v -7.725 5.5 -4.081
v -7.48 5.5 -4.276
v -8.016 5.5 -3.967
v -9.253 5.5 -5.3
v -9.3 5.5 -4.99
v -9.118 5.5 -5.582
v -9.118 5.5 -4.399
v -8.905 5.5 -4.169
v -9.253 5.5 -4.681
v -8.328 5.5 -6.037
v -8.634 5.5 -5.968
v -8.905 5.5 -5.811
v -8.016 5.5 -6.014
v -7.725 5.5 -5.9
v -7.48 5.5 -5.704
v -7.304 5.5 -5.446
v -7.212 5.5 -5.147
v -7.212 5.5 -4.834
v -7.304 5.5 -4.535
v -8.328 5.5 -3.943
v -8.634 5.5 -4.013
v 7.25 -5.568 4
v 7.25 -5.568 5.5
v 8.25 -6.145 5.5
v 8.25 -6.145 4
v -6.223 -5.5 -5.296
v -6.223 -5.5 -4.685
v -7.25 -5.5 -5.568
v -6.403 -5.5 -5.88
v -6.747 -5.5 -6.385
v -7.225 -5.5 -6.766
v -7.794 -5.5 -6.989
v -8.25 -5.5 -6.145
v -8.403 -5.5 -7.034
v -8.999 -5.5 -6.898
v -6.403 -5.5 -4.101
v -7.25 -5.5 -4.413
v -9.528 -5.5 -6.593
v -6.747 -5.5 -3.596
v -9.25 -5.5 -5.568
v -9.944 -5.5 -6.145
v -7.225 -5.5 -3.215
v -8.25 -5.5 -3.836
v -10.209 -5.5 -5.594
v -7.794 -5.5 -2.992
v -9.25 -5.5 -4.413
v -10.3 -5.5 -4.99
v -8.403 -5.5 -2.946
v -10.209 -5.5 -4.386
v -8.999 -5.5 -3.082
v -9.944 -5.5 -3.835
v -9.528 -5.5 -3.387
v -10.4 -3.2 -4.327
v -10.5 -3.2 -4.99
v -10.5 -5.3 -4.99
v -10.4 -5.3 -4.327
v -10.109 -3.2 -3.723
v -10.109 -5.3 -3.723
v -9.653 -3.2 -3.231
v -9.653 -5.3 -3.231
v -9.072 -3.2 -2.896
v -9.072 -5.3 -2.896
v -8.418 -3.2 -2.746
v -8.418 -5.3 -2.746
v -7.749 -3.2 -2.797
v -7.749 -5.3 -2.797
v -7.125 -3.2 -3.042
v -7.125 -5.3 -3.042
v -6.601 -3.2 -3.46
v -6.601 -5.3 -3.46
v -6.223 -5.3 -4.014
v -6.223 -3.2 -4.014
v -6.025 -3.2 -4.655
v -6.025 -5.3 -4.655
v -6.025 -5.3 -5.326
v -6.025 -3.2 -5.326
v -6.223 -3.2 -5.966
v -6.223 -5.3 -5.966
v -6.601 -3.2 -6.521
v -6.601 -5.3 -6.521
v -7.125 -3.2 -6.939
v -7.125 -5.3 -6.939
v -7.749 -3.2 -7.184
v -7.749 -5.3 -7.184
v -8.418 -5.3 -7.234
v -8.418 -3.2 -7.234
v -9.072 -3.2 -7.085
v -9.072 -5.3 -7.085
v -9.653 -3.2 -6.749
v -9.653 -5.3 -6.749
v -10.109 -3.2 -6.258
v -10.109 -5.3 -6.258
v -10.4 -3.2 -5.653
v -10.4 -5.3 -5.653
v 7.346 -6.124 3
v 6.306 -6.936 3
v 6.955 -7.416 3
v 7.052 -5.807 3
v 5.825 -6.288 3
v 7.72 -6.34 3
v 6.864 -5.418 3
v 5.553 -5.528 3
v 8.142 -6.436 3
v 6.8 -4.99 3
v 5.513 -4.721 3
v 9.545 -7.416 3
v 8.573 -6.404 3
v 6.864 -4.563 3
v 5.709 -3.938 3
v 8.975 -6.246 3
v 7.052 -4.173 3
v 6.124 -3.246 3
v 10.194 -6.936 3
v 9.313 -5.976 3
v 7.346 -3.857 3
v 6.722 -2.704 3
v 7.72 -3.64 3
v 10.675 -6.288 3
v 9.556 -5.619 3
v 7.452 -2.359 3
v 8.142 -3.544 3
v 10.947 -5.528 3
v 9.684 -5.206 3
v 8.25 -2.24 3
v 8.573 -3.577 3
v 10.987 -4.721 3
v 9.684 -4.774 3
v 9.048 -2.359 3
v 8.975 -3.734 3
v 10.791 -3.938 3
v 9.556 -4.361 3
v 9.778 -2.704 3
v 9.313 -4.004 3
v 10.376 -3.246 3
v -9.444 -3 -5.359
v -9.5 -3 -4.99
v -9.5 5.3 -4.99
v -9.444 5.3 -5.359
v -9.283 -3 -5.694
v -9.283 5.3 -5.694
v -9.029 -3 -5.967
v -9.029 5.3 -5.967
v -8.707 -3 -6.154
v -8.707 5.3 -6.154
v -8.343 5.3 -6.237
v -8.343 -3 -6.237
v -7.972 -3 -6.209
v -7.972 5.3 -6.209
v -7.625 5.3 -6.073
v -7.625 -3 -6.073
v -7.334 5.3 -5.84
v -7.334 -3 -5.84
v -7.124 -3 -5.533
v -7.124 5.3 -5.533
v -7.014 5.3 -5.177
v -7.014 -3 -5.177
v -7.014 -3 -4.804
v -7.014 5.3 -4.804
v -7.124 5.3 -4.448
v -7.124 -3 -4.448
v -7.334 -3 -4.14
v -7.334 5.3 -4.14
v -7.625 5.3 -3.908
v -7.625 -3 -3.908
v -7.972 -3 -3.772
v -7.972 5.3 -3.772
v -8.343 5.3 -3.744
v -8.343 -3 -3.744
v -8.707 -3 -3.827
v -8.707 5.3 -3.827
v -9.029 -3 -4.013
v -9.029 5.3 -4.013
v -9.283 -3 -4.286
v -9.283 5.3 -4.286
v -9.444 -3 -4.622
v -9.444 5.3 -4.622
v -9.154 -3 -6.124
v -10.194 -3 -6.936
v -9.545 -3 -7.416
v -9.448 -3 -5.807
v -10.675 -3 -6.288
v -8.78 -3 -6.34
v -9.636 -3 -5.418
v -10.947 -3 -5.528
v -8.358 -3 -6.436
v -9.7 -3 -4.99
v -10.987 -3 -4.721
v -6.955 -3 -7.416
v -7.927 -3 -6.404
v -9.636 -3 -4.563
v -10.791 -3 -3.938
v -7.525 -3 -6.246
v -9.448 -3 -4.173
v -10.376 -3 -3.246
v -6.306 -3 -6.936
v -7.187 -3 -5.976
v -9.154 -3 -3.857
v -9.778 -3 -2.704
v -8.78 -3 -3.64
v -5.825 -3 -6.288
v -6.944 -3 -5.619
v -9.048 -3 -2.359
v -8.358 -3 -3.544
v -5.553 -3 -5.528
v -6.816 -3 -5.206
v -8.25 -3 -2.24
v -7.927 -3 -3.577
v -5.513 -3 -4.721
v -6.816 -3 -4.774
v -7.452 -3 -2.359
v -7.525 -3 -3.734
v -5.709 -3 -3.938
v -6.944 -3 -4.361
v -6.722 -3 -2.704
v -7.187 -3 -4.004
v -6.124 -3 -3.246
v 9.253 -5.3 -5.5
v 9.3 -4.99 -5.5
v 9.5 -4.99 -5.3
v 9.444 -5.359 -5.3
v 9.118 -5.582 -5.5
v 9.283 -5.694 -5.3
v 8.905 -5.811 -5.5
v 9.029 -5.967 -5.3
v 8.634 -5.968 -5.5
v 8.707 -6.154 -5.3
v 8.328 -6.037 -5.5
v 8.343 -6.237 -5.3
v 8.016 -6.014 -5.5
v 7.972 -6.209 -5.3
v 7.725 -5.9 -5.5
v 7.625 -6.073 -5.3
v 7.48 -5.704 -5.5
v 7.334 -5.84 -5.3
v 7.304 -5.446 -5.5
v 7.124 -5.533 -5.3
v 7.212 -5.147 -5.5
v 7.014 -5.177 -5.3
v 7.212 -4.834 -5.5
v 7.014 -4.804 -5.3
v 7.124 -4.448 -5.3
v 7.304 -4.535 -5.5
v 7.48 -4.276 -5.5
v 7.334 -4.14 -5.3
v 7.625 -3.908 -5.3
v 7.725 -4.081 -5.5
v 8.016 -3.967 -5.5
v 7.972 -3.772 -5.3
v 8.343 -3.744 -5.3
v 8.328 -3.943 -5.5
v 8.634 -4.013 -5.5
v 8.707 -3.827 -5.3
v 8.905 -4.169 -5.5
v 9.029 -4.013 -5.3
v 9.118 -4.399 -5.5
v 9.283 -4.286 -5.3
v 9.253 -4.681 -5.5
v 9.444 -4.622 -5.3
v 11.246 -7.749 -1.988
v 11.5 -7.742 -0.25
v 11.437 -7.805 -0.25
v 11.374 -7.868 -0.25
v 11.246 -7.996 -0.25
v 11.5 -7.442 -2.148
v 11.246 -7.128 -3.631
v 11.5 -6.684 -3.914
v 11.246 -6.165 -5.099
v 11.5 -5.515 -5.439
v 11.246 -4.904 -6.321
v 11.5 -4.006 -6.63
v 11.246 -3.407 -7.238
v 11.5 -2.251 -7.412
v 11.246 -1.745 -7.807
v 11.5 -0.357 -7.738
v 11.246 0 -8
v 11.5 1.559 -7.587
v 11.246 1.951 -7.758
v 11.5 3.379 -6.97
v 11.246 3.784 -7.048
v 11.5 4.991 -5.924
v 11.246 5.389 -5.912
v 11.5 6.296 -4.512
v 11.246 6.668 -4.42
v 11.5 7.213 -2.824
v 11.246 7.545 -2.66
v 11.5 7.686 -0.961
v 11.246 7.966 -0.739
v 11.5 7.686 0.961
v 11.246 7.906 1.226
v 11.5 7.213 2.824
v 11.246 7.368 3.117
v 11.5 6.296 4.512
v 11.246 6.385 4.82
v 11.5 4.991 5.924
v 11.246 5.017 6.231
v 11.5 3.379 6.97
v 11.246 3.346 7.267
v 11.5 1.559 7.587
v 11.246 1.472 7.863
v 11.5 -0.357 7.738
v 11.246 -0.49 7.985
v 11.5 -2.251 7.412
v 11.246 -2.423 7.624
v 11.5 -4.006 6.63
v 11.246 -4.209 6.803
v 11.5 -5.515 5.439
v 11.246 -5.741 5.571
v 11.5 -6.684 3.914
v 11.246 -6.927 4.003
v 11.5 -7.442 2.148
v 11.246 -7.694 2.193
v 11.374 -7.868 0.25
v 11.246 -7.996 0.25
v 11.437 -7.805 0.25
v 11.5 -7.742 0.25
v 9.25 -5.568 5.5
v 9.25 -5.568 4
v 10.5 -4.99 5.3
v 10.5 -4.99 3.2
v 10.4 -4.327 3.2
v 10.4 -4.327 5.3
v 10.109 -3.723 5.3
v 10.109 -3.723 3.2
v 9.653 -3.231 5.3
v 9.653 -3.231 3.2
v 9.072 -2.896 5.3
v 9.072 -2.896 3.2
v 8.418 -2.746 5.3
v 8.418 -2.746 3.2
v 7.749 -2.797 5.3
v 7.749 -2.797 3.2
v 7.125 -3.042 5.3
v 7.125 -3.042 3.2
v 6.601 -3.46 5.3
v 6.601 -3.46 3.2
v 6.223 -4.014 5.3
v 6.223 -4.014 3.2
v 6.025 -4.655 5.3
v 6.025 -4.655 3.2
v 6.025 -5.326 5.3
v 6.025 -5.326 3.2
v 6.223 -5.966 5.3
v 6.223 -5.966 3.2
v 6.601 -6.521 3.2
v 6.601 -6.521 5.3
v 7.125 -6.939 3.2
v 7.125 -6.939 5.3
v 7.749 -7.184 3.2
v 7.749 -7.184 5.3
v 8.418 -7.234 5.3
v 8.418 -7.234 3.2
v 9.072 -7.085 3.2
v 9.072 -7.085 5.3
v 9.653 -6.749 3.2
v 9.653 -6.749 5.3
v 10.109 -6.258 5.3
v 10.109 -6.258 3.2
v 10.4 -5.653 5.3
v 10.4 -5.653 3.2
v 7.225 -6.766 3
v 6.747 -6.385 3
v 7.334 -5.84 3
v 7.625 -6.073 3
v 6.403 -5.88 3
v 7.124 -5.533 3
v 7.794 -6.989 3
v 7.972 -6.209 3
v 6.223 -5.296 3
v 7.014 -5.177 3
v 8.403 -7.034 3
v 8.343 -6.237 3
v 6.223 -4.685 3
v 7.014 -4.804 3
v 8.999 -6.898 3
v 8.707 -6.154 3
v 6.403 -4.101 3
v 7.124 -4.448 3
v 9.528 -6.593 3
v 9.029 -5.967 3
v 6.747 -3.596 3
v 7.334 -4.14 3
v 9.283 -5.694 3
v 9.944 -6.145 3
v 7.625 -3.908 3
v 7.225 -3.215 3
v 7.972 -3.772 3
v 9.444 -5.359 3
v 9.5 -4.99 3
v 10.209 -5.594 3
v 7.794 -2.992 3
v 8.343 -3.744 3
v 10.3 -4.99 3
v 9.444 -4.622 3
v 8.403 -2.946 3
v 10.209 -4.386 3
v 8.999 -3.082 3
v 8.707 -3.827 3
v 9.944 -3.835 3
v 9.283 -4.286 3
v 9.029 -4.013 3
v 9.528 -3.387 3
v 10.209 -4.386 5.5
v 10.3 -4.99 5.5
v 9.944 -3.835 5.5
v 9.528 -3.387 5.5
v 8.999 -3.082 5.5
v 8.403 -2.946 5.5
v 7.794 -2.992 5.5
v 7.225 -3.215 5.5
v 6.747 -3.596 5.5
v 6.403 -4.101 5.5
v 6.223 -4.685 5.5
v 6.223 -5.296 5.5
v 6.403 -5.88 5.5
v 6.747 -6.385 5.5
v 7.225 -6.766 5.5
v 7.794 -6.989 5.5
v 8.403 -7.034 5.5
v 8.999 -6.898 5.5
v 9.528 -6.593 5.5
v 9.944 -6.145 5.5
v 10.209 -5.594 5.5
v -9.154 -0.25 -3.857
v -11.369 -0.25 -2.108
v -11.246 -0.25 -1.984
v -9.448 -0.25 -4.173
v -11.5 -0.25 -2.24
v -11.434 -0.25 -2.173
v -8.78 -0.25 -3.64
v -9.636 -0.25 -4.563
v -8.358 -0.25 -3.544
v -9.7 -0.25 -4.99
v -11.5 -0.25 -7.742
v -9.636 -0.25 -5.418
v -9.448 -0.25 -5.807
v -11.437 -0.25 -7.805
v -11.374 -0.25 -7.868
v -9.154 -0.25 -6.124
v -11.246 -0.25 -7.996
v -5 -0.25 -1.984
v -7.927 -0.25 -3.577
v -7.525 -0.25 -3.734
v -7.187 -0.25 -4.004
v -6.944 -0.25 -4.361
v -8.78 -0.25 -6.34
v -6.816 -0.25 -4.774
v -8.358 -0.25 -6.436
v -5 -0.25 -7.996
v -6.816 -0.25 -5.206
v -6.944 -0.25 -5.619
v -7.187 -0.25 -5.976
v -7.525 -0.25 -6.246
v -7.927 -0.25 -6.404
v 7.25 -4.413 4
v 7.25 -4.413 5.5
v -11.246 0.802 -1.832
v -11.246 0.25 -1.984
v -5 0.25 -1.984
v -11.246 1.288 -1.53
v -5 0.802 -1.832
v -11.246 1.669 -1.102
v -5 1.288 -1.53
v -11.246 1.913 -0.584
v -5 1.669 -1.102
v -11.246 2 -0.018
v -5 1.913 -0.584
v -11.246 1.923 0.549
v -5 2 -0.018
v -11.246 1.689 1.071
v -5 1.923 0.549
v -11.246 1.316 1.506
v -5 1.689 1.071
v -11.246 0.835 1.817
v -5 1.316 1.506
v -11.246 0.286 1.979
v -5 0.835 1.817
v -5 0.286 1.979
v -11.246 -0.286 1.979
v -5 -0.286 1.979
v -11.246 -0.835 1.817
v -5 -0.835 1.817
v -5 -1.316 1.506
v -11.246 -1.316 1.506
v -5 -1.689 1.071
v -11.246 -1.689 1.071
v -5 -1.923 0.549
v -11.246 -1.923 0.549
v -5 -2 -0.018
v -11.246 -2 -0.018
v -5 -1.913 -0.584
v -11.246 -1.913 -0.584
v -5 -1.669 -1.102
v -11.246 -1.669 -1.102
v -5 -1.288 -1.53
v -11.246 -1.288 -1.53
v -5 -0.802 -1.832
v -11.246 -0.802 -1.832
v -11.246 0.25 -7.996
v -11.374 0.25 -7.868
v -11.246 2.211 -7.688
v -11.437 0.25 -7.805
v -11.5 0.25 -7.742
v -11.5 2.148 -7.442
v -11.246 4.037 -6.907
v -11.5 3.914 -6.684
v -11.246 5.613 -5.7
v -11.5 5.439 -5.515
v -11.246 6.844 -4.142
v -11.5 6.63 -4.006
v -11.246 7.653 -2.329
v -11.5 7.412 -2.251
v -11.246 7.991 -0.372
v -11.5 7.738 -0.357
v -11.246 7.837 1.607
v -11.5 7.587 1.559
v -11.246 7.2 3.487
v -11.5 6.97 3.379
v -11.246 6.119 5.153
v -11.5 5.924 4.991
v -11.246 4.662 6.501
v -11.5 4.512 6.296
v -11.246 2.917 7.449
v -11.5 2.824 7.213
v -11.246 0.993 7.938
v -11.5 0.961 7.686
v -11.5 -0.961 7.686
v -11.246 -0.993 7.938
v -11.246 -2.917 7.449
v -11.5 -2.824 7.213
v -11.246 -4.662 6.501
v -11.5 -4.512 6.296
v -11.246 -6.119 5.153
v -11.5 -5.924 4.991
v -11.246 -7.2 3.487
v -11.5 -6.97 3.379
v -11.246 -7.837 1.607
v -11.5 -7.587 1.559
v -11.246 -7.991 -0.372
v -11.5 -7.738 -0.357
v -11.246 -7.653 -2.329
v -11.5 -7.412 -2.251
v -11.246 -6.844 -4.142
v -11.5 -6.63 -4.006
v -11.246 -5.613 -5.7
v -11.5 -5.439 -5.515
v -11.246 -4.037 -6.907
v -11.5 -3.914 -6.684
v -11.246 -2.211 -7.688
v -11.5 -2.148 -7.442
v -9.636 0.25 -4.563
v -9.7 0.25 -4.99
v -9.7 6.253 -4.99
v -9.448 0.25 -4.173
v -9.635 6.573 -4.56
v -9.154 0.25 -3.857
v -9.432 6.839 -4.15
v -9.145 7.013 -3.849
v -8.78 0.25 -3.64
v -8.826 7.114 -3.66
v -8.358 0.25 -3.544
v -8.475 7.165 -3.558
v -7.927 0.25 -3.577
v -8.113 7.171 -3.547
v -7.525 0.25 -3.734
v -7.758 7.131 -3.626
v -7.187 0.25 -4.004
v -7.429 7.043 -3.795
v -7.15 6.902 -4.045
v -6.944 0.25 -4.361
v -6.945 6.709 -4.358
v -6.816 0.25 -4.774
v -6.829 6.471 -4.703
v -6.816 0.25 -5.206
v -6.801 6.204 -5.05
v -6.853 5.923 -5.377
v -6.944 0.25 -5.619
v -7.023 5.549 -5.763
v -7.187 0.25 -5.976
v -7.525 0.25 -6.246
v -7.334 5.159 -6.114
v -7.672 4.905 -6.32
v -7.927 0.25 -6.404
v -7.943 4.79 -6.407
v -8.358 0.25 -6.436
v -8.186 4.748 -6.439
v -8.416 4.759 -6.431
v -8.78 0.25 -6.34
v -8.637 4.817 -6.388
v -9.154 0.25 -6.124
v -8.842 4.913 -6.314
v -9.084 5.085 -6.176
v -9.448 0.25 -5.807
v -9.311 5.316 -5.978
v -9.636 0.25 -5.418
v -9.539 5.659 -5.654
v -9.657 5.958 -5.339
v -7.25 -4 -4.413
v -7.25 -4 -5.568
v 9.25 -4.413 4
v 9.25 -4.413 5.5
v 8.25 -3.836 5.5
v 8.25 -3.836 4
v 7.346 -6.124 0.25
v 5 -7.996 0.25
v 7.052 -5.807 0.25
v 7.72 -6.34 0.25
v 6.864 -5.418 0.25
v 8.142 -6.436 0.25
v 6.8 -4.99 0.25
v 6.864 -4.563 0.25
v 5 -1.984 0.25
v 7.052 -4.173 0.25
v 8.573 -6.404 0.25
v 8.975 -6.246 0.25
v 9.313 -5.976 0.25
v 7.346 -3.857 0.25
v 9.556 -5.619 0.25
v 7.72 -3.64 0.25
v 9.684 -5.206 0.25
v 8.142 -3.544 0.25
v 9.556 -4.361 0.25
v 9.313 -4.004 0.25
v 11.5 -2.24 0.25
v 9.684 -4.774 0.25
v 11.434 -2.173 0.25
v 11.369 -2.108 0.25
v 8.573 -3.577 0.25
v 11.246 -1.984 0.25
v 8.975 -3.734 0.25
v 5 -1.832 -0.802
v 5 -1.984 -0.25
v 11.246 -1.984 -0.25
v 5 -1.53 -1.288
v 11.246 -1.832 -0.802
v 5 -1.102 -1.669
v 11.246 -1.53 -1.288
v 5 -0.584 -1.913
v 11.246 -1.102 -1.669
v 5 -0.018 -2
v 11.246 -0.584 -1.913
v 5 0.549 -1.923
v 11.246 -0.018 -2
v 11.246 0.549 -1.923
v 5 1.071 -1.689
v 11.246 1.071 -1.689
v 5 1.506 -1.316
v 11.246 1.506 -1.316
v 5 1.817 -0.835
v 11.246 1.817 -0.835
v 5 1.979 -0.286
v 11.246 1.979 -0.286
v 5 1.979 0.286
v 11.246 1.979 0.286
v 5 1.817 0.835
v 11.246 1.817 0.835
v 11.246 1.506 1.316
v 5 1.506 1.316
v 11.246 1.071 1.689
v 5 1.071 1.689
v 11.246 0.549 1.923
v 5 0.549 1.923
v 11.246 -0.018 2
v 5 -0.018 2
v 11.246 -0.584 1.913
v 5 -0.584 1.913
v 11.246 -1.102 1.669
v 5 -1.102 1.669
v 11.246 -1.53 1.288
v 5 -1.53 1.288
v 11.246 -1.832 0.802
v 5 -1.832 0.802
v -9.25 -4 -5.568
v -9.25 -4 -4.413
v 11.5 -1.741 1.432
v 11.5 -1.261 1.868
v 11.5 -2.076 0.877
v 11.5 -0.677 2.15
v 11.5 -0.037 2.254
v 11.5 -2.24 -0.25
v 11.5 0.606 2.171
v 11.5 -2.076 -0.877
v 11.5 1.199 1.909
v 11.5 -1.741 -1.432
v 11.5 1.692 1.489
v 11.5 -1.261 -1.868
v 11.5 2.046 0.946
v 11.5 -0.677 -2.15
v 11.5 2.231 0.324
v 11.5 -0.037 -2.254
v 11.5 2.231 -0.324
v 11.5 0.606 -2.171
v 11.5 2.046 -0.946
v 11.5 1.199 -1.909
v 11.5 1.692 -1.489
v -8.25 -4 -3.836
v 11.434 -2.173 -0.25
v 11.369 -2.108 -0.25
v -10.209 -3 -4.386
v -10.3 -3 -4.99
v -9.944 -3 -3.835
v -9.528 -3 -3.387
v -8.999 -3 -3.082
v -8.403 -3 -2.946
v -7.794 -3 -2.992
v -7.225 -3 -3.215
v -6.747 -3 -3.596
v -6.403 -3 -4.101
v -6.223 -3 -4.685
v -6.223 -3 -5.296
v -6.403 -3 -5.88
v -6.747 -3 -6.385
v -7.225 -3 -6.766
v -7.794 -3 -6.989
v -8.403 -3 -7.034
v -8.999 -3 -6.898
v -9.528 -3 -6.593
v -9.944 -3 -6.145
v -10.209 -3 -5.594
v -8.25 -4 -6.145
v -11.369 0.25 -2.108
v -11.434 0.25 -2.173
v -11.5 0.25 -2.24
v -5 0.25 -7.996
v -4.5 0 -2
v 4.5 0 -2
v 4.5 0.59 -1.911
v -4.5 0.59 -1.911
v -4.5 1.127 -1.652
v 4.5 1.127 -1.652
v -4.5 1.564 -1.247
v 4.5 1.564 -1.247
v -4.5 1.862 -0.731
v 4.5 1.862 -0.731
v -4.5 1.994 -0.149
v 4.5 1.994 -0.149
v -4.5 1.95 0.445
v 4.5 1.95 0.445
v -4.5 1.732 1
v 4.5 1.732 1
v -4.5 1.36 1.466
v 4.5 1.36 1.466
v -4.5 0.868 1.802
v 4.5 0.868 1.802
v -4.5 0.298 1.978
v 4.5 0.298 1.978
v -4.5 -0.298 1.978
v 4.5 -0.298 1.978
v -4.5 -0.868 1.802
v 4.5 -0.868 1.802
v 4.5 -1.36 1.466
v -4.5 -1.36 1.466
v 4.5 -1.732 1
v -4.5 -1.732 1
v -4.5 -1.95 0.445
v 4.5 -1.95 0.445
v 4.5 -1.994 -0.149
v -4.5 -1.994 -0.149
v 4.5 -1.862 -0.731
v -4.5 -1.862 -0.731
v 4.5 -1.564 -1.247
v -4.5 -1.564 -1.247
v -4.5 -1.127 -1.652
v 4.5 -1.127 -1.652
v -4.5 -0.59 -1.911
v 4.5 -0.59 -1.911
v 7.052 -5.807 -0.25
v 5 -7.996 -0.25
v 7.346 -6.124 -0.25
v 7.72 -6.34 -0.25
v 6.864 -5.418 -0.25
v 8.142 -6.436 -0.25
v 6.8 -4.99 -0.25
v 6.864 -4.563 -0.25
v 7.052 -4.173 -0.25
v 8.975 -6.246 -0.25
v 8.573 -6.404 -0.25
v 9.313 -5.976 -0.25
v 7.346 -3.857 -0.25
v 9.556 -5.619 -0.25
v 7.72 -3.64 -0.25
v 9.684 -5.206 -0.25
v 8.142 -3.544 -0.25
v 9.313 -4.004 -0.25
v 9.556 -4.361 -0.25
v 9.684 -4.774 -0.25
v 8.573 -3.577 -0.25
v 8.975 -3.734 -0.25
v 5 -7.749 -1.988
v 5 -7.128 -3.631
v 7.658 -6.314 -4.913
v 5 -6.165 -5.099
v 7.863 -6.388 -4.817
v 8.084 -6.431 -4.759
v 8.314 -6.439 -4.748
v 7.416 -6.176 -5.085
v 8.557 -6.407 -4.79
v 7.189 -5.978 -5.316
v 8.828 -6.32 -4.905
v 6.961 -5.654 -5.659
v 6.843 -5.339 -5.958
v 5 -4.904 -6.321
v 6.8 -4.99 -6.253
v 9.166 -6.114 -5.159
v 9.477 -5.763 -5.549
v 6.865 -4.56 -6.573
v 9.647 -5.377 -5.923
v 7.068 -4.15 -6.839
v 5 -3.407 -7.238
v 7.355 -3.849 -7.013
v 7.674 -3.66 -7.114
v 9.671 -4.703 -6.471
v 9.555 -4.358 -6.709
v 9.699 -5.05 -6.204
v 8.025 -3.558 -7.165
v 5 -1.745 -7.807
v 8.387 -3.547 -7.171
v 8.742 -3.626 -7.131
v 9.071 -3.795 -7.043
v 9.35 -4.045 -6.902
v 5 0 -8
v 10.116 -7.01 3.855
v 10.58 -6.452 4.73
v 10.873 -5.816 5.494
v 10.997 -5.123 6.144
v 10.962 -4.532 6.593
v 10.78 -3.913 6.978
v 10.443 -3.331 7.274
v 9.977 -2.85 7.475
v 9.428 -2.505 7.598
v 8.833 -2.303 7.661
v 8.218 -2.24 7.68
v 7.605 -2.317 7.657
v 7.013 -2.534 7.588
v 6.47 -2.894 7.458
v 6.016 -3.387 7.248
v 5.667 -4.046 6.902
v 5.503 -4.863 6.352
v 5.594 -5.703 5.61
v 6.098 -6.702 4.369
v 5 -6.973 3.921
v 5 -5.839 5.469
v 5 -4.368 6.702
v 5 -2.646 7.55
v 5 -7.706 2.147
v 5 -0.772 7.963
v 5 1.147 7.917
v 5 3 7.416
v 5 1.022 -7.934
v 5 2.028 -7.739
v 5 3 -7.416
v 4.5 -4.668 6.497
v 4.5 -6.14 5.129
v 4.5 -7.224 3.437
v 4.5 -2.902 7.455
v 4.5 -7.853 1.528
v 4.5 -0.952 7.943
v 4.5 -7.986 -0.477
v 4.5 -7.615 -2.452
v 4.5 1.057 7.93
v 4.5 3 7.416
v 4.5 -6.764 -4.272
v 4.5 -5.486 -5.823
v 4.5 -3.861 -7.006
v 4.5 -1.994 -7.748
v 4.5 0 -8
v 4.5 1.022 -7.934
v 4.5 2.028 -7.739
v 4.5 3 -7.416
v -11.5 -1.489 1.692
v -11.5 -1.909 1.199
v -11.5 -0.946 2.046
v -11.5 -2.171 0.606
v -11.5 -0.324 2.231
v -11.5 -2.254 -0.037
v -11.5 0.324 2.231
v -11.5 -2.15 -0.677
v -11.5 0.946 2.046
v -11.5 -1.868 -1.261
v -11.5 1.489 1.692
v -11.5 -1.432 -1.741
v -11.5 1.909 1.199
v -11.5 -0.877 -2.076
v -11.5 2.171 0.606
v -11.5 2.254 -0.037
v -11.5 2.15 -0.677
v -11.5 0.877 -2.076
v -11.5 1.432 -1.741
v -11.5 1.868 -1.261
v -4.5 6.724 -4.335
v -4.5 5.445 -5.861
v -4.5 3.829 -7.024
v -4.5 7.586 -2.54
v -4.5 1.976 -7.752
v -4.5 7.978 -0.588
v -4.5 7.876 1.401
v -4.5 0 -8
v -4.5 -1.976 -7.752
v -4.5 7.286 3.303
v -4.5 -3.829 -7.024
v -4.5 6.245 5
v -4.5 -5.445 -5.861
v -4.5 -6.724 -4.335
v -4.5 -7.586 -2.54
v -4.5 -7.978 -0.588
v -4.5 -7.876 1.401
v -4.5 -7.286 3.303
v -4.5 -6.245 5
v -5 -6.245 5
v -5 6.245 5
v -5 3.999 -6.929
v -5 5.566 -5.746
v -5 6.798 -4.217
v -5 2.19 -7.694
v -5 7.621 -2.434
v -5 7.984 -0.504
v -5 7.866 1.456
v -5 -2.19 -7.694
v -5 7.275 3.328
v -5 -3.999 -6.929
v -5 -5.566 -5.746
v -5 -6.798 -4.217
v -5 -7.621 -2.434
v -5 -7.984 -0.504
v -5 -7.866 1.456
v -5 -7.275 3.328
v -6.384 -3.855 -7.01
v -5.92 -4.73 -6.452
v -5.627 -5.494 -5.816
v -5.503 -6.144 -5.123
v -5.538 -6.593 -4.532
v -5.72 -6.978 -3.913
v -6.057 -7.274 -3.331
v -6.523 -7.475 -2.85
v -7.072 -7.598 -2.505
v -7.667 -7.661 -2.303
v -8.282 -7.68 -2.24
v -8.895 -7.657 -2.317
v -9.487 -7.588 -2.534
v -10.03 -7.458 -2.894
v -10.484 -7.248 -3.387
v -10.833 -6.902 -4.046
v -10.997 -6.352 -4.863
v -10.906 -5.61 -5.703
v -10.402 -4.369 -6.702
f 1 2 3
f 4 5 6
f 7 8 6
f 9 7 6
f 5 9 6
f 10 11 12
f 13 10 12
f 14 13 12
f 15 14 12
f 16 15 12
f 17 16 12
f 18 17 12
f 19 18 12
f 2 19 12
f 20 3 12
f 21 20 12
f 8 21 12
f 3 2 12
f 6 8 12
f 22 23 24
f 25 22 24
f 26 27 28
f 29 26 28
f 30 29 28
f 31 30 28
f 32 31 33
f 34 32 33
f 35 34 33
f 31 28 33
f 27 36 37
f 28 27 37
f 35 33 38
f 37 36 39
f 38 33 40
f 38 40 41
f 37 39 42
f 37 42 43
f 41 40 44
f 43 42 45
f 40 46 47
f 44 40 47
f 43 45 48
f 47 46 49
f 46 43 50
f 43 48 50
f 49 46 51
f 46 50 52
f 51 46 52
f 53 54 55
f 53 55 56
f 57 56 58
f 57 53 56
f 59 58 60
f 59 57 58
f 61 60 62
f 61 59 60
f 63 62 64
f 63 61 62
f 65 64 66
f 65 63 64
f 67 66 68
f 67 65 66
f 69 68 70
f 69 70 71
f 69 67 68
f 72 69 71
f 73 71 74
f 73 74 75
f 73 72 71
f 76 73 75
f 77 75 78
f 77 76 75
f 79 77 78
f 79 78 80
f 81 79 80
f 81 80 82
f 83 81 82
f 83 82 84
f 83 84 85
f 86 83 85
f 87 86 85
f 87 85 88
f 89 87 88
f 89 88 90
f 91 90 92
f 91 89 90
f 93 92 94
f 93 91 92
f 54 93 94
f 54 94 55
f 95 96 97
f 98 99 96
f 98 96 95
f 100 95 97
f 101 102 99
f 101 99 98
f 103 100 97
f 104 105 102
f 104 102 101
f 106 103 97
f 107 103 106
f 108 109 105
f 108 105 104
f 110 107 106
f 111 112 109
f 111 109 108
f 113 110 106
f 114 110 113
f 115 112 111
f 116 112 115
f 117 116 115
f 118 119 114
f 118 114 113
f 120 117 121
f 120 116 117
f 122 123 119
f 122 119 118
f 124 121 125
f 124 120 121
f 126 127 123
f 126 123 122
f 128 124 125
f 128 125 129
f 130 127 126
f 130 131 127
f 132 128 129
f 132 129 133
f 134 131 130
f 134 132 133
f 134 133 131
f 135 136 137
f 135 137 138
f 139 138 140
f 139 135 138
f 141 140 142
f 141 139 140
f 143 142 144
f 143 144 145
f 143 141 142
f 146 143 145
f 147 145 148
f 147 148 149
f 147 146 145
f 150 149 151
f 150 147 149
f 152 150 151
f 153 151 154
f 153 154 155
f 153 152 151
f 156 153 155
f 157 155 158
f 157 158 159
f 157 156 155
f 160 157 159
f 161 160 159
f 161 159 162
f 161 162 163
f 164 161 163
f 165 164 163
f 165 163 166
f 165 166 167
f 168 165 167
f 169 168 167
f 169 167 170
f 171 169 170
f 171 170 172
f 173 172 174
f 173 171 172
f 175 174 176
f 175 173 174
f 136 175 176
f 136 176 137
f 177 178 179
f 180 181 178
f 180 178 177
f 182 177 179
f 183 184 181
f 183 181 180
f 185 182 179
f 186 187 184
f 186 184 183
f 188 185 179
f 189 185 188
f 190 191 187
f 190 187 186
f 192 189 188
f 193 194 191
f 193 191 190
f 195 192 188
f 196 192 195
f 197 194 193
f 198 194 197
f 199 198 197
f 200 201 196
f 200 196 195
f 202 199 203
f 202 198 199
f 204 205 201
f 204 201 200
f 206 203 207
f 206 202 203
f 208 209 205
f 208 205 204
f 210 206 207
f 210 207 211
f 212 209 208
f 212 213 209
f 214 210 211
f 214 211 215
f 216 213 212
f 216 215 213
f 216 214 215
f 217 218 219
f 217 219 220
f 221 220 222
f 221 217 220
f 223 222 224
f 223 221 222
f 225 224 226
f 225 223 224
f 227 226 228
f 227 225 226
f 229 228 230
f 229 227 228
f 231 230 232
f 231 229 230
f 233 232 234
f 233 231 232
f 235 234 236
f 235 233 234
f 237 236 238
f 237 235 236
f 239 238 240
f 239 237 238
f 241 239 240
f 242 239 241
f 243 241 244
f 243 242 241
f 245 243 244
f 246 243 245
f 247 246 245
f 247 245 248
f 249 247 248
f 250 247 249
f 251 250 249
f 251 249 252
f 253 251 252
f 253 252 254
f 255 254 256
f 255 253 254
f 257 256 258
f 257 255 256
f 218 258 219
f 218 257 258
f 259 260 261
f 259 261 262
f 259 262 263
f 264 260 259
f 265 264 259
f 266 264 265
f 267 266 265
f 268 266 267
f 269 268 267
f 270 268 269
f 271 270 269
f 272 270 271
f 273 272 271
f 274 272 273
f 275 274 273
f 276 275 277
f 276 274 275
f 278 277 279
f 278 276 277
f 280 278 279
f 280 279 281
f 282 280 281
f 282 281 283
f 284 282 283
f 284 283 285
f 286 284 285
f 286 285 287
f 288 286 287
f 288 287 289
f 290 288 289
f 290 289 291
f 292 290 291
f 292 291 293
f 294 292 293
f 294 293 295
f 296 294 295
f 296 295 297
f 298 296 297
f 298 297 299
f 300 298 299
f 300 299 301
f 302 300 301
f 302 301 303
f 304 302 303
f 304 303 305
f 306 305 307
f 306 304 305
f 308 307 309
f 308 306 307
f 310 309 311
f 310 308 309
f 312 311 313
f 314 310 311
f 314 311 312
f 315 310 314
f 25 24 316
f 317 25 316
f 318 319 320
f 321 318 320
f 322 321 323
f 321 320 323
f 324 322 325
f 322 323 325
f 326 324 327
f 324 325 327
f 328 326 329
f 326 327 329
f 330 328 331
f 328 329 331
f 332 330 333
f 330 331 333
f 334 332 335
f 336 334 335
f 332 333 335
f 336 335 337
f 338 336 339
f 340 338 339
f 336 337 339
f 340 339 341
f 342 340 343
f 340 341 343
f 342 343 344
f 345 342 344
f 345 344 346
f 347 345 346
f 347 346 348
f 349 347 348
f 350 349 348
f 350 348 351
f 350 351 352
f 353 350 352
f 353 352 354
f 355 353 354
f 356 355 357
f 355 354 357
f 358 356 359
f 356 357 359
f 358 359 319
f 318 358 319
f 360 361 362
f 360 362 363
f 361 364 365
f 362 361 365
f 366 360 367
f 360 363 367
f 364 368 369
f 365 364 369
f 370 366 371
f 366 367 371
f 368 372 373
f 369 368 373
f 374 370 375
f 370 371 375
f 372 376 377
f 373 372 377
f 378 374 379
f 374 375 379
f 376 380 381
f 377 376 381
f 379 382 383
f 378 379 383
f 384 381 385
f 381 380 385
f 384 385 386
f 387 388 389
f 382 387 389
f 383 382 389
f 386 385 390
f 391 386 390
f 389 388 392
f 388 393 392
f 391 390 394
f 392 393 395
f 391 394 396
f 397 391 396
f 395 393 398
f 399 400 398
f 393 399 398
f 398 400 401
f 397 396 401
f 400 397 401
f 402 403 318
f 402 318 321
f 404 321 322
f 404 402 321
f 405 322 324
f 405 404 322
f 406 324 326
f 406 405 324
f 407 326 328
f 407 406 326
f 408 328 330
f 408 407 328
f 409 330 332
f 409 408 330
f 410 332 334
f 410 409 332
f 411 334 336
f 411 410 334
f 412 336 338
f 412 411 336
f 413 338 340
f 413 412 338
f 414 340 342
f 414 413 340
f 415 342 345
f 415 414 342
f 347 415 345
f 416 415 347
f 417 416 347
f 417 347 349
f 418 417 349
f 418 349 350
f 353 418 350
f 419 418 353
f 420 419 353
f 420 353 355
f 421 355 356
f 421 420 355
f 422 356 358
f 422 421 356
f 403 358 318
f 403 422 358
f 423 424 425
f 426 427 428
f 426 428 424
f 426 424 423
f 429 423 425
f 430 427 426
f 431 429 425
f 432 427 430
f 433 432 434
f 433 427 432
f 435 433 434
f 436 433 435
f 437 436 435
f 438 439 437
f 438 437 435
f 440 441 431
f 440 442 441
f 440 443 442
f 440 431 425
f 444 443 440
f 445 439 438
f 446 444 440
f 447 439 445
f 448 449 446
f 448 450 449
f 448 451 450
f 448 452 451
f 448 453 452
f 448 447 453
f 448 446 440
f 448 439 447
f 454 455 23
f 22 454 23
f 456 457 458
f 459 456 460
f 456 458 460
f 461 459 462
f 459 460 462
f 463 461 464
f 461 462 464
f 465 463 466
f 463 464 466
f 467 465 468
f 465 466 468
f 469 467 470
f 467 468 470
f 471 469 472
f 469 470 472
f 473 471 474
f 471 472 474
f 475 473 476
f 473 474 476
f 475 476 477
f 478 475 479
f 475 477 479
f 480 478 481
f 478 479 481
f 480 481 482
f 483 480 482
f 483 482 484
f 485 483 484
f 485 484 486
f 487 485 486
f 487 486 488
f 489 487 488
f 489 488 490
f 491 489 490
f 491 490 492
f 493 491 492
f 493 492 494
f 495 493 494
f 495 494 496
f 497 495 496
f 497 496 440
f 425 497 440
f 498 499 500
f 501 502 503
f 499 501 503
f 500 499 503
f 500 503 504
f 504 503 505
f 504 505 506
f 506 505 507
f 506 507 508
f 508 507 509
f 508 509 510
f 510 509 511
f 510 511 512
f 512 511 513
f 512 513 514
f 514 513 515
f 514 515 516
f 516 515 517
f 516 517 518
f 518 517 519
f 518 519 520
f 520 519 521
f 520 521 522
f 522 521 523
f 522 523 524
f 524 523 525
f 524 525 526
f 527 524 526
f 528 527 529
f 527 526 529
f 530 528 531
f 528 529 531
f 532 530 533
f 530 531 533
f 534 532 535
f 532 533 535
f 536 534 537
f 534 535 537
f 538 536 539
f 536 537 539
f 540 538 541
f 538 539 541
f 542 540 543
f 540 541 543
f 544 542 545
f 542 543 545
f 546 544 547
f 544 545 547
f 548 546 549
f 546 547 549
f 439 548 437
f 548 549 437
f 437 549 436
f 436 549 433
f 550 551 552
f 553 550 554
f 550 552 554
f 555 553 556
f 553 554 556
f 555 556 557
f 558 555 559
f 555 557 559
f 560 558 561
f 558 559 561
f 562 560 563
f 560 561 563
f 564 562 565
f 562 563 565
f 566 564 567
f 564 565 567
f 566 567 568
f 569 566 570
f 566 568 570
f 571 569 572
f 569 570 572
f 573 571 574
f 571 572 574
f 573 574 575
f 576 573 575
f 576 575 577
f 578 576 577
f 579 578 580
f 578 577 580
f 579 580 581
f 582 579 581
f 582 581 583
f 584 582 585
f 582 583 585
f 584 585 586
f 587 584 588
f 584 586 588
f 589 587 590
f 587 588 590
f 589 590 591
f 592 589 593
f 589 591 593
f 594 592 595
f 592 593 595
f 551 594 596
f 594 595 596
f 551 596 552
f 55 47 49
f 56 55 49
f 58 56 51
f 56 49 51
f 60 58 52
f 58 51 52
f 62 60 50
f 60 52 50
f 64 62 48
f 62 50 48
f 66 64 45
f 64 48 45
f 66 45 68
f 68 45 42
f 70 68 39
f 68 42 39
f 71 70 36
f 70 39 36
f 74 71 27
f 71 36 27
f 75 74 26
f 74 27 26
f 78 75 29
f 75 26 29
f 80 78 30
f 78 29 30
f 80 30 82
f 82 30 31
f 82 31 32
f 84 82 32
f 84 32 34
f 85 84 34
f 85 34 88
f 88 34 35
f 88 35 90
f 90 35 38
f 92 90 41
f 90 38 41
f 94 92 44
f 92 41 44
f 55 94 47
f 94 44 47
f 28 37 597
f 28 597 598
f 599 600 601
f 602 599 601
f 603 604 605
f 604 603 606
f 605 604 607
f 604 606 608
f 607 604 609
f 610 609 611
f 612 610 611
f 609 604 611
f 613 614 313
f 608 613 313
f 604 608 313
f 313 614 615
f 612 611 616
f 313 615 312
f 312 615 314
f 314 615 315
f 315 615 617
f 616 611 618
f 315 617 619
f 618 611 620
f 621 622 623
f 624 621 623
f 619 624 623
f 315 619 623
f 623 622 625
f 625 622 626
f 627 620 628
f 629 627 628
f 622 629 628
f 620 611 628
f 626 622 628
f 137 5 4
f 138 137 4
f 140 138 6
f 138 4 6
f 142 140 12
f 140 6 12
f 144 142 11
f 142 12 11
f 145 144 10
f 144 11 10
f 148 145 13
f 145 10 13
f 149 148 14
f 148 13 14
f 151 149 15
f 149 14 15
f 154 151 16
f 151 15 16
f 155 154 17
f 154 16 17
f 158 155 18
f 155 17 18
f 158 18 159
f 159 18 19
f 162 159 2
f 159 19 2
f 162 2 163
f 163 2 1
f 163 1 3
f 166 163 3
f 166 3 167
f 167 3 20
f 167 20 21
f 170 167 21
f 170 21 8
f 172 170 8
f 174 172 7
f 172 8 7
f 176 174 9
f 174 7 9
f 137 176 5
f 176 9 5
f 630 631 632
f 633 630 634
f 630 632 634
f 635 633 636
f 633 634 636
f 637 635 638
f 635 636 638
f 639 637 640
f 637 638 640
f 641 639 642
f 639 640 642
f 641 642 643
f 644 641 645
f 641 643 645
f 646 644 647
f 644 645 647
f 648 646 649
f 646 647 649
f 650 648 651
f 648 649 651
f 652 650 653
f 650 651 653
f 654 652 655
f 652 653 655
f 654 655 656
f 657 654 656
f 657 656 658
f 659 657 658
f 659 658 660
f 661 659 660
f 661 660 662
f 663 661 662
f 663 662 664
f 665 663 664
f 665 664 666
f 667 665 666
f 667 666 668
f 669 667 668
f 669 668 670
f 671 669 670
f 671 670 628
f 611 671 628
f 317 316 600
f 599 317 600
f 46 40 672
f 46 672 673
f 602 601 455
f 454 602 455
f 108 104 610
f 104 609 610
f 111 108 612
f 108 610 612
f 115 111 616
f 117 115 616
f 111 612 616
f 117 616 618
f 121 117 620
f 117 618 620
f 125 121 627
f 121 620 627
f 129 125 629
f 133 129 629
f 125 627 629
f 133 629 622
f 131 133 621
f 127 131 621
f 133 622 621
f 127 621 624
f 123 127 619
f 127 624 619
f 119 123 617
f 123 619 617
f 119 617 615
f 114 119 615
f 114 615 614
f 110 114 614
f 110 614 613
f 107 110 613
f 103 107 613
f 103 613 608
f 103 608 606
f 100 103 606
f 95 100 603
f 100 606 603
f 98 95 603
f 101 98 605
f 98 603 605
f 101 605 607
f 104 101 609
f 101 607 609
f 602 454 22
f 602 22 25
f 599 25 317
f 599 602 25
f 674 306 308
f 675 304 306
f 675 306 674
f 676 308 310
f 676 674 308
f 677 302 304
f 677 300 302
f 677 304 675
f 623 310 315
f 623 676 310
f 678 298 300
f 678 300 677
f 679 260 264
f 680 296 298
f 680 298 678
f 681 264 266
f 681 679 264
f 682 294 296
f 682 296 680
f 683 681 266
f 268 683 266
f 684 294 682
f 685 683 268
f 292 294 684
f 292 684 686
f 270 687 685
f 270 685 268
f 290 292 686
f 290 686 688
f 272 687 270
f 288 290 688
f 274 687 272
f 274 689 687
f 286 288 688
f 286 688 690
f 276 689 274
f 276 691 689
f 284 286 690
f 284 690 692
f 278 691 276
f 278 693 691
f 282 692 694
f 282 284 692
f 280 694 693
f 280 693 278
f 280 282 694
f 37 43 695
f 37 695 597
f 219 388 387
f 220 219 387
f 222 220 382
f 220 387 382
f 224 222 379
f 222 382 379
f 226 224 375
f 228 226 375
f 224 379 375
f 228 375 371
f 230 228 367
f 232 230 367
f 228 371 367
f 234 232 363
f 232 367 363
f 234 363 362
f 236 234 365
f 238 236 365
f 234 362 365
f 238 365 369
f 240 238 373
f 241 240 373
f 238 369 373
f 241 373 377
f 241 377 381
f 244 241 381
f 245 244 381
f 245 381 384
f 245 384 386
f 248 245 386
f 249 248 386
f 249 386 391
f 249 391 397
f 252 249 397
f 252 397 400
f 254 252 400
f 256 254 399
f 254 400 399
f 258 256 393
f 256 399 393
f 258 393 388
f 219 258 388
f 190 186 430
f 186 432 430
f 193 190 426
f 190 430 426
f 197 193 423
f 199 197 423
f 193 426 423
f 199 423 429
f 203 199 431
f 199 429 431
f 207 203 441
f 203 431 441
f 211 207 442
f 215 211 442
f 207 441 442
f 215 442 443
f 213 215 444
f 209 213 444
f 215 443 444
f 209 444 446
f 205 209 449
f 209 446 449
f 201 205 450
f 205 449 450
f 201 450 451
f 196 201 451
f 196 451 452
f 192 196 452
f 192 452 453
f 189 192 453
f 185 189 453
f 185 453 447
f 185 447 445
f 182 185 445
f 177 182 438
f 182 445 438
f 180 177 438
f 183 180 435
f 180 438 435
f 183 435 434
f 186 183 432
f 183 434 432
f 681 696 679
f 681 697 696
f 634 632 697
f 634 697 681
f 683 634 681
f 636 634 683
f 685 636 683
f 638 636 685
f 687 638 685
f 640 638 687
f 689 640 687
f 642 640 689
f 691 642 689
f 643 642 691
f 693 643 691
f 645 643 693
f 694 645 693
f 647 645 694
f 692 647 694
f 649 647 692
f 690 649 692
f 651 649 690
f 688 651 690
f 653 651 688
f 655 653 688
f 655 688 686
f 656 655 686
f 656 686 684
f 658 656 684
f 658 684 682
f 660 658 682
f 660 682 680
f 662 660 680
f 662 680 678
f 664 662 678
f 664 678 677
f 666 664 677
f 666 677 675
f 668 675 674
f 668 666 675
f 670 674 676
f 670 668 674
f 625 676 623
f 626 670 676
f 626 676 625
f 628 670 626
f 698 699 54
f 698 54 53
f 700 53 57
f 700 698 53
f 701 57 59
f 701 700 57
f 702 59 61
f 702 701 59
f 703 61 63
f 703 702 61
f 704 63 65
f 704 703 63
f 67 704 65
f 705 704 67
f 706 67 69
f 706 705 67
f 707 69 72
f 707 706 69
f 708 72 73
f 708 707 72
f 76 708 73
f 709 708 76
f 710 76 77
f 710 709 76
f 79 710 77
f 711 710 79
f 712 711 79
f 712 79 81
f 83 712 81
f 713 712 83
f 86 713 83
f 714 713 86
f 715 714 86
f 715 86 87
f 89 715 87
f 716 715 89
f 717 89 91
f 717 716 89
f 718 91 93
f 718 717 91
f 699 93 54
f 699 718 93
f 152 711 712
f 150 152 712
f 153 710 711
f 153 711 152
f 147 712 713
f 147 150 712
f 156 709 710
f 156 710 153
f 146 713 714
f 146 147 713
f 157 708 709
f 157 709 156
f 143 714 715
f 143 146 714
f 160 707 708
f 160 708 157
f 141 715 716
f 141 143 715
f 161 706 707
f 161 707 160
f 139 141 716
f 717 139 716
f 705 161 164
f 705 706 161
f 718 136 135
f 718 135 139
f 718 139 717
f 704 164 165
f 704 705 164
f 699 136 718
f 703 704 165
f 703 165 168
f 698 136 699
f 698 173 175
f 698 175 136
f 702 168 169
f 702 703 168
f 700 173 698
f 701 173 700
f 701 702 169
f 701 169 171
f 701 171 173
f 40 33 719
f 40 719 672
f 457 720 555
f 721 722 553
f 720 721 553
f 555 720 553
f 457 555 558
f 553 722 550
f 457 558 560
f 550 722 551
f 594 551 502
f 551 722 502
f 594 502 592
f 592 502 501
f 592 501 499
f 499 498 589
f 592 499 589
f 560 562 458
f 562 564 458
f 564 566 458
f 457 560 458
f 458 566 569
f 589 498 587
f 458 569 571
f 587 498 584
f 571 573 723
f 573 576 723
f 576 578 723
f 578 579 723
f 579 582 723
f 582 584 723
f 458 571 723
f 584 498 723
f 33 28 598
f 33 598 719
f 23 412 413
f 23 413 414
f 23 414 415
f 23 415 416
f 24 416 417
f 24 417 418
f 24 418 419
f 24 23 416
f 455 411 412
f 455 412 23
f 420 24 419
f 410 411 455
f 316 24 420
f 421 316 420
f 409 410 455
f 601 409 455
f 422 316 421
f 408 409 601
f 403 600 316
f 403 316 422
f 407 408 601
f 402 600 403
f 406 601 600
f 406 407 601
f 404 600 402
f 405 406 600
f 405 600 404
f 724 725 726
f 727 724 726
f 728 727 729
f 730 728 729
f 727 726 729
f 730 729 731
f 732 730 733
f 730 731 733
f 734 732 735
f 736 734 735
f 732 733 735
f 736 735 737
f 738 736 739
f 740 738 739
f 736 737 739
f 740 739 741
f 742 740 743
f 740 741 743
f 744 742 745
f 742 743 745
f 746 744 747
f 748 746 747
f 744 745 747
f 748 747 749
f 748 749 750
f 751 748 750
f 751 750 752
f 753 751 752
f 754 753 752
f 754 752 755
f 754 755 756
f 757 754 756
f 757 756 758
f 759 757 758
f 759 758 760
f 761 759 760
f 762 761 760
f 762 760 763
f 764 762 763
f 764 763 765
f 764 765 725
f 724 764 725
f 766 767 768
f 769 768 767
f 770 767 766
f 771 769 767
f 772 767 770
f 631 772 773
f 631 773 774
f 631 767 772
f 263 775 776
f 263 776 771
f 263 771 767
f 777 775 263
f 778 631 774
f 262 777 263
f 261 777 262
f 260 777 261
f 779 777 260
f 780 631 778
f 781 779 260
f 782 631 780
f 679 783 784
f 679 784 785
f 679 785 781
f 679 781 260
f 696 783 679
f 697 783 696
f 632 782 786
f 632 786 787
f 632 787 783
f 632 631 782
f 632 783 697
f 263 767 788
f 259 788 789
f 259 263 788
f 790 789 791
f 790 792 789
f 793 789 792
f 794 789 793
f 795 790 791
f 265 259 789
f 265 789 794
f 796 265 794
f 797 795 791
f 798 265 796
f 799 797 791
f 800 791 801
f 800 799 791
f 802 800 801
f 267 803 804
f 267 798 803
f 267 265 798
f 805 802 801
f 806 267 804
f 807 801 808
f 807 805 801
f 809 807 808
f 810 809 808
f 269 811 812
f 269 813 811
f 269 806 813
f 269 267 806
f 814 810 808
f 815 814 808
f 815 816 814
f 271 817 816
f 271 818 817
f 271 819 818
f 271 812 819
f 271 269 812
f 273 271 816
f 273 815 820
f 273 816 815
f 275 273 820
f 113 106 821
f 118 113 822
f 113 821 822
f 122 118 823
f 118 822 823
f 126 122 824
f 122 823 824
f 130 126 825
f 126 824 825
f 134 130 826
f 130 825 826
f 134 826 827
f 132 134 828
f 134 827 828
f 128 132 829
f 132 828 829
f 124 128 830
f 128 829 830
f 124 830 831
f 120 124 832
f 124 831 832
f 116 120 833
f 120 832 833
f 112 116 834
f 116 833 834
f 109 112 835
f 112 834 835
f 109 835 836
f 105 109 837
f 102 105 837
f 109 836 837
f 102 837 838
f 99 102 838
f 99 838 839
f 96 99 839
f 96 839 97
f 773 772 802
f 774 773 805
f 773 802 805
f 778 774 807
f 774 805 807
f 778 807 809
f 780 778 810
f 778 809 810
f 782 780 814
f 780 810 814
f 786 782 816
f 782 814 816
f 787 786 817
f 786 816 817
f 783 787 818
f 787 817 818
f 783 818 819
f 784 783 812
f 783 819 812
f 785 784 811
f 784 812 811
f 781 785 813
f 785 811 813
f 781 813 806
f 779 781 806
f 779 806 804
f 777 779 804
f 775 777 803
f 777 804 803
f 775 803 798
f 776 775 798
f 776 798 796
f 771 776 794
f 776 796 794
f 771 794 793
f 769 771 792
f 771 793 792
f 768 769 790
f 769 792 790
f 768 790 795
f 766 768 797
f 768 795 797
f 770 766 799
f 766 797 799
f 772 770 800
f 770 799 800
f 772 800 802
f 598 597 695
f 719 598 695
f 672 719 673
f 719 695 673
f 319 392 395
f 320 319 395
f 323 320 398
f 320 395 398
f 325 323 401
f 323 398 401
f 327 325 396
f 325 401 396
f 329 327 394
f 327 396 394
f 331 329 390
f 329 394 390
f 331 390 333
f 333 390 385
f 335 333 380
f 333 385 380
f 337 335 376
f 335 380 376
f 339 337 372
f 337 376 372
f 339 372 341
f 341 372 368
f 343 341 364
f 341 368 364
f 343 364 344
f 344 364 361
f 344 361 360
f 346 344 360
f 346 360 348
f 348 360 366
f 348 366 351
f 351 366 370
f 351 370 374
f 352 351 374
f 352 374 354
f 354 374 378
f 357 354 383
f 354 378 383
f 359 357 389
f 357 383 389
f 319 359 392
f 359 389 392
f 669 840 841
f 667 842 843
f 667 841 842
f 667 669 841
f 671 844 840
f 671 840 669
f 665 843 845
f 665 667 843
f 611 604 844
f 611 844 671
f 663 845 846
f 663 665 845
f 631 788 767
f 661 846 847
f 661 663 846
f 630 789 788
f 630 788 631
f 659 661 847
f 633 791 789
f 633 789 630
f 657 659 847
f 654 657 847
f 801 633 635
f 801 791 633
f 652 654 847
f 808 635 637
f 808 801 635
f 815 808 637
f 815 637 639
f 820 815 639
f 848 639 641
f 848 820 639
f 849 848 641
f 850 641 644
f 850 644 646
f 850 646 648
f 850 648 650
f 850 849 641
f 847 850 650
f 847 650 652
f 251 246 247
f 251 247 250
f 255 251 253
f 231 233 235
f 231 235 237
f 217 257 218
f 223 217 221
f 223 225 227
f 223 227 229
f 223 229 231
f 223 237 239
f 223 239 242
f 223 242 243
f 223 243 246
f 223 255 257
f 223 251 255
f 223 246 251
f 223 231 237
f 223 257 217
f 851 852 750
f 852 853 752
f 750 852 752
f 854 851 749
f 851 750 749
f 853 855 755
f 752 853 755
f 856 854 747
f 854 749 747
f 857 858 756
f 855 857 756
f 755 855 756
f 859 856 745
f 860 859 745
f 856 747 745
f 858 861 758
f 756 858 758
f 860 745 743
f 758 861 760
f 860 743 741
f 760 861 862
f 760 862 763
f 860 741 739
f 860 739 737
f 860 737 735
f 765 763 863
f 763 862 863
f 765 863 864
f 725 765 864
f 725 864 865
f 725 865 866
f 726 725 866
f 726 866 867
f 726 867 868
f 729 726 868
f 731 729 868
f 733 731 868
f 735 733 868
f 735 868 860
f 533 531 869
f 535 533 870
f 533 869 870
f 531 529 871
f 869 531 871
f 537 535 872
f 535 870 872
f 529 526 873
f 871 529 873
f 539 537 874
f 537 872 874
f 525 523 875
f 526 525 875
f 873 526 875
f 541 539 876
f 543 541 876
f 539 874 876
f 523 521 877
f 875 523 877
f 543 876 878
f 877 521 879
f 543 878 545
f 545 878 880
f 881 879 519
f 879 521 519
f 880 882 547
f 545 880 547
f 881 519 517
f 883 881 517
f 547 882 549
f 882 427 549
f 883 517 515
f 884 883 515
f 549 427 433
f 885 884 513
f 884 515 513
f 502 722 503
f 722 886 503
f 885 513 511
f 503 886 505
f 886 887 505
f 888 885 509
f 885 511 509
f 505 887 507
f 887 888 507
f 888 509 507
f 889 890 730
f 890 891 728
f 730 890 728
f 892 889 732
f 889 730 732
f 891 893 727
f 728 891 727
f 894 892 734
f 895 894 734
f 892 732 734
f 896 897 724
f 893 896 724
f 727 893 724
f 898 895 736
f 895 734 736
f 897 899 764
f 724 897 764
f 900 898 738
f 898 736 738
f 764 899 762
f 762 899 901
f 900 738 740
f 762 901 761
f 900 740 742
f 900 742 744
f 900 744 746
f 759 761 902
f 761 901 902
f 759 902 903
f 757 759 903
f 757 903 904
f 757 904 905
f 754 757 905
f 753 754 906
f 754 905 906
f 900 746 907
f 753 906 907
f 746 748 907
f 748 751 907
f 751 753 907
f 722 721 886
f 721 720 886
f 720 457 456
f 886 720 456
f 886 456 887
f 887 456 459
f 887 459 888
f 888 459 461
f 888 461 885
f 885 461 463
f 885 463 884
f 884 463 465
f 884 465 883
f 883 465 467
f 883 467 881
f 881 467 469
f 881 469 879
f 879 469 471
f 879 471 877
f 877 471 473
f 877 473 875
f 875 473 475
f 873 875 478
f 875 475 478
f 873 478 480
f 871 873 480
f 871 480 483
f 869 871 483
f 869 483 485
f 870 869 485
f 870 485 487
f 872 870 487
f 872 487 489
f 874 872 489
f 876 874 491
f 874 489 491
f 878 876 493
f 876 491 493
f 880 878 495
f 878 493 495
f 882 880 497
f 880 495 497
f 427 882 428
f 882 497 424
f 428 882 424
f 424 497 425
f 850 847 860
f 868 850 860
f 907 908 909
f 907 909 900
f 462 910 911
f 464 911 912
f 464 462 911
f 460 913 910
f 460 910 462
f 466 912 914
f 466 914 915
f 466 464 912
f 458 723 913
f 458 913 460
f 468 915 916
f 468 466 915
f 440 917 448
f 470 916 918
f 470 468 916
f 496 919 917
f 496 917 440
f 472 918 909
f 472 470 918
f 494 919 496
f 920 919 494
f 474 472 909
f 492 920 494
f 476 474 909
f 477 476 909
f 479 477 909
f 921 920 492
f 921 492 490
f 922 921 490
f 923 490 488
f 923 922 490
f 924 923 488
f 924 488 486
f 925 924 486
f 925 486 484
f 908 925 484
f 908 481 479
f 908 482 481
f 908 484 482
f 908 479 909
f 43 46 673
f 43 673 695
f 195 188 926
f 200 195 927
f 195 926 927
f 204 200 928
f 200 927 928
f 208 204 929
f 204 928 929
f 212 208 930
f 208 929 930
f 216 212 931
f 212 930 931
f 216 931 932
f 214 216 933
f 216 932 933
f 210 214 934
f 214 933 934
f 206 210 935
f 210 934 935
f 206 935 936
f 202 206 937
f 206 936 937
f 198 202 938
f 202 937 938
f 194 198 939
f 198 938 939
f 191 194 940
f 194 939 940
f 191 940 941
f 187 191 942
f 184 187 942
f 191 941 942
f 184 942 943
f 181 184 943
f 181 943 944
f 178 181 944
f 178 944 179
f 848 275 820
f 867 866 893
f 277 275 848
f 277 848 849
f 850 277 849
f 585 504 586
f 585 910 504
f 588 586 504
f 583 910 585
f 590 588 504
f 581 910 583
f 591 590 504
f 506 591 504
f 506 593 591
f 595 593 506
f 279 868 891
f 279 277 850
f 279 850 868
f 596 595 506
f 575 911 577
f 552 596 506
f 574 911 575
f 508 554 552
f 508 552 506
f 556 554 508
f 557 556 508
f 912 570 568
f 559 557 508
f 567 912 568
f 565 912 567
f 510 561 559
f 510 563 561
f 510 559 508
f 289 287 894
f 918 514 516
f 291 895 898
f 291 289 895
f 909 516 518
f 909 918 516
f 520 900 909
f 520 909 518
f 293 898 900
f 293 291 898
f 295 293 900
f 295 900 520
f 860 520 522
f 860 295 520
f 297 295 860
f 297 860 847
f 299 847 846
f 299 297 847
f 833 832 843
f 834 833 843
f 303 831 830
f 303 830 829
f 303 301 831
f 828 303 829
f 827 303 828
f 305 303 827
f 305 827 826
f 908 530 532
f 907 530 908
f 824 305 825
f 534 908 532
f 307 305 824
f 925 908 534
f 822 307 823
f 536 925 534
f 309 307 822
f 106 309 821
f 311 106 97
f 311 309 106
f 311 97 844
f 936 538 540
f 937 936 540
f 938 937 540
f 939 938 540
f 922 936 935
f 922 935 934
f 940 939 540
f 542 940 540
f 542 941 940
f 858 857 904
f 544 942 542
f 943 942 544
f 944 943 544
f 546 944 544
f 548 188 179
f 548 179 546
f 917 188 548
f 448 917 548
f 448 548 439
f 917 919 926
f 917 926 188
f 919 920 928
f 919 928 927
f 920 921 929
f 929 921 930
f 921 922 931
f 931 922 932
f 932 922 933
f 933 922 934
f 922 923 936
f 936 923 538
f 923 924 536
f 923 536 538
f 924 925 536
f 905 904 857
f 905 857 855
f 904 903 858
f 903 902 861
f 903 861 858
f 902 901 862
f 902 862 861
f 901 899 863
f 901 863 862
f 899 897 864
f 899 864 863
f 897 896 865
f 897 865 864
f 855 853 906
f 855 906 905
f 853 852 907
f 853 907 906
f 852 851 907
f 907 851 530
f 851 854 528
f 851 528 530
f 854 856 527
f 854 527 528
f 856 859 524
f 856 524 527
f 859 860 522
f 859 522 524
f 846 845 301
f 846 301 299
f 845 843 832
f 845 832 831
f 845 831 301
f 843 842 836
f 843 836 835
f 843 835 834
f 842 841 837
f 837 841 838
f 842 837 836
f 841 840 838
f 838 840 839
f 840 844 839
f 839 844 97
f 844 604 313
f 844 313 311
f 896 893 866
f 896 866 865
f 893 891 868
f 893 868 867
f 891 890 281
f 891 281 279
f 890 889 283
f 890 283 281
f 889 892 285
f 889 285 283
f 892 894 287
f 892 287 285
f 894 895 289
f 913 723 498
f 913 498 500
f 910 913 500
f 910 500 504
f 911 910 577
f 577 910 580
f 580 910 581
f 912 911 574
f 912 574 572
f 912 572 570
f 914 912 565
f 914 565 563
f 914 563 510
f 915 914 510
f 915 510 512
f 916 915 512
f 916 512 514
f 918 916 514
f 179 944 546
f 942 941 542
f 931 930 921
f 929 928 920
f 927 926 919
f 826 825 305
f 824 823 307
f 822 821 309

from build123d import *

# Parameters (mm, degrees)
SKETCH1_R                        = 8
BOSS_EXTRUDE1_DEPTH              = 11.5
SKETCH2_R                        = 2
CUT_EXTRUDE1_DEPTH               = 24
CHAMFER1_SIZE                    = 0.254
SKETCH4_W                        = 0.5
SKETCH4_H                        = 13
CUT_EXTRUDE2_DEPTH               = 17
SKETCH7_W                        = 0.5
SKETCH7_H                        = 11
CUT_EXTRUDE3_DEPTH               = 17
SKETCH8_W                        = 6.5
SKETCH8_H                        = 8
CUT_EXTRUDE5_DEPTH               = 0.25
SKETCH13_W                       = 6.5
SKETCH13_H                       = 8
CUT_EXTRUDE6_DEPTH               = 0.25
CBORE_FOR_M2_5_SHCS1_D           = 2.9
CBORE_FOR_M2_5_SHCS1_CBORE_D     = 5.5
CBORE_FOR_M2_5_SHCS1_CBORE_DEPTH = 5
CBORE_FOR_M2_5_SHCS2_D           = 2.9
CBORE_FOR_M2_5_SHCS2_CBORE_D     = 5.5
CBORE_FOR_M2_5_SHCS2_CBORE_DEPTH = 5
SKETCH16_R                       = 2.25
BOSS_EXTRUDE2_DEPTH              = 2.5
SKETCH17_R                       = 1.25
BOSS_EXTRUDE3_DEPTH              = 8.5
CHAMFER2_SIZE                    = 0.2
CUT_EXTRUDE7_DEPTH               = 1.5
CIRPATTERN1_COUNT                = 2
CIRPATTERN1_ANGLE                = 90


with BuildPart() as part:
    # Sketch1 → Boss-Extrude1 (new body, symmetric)
    with BuildSketch(Plane(origin=(0, 0, 0), x_dir=(0, 0, -1), z_dir=(1, 0, 0))):
        Circle(SKETCH1_R)
    extrude(amount=BOSS_EXTRUDE1_DEPTH, both=True)

    # Sketch2 → Cut-Extrude1 (cut, through all)
    with BuildSketch(Plane(origin=(11.5, 0, 0), x_dir=(0, 0, -1), z_dir=(1, 0, 0))):
        Circle(SKETCH2_R)
    extrude(amount=-CUT_EXTRUDE1_DEPTH, mode=Mode.SUBTRACT)

    # Chamfer1
    chamfer1_edges = [part.edges().sort_by_distance(p)[0] for p in [
        (-11.5, 0, 8),
        (11.5, 0, 8),
        (-11.5, 0, 2),
        (11.5, 0, 2),
    ]]
    chamfer(chamfer1_edges, length=CHAMFER1_SIZE)

    # Sketch4 → Cut-Extrude2 (cut, through all)
    with BuildSketch(Plane.XZ.offset(8)):
        with Locations((-4.75, -1.5)):
            Rectangle(SKETCH4_W, SKETCH4_H)
    extrude(amount=-CUT_EXTRUDE2_DEPTH, mode=Mode.SUBTRACT)

    # Sketch7 → Cut-Extrude3 (cut, through all)
    with BuildSketch(Plane(origin=(0, 0, -8), x_dir=(-1, 0, 0), z_dir=(0, 0, -1))):
        with Locations((-4.75, -2.5)):
            Rectangle(SKETCH7_W, SKETCH7_H)
    extrude(amount=-CUT_EXTRUDE3_DEPTH, mode=Mode.SUBTRACT)

    # Sketch8 → Cut-Extrude5 (cut, symmetric)
    with BuildSketch(Plane(origin=(0, 0, 0), x_dir=(1, 0, 0), z_dir=(0, 1, 0))):
        with Locations((-8.25, 4)):
            Rectangle(SKETCH8_W, SKETCH8_H)
    extrude(amount=CUT_EXTRUDE5_DEPTH, both=True, mode=Mode.SUBTRACT)

    # Sketch13 → Cut-Extrude6 (cut, symmetric)
    with BuildSketch(Plane.XY):
        with Locations((8.25, -4)):
            Rectangle(SKETCH13_W, SKETCH13_H)
    extrude(amount=CUT_EXTRUDE6_DEPTH, both=True, mode=Mode.SUBTRACT)

    # CBORE for M2.5 SHCS1 (through all)
    with Locations(Plane.XZ.offset(8)):
        with Locations((-8.25, -4.99020314)):
            CounterBoreHole(CBORE_FOR_M2_5_SHCS1_D / 2, CBORE_FOR_M2_5_SHCS1_CBORE_D / 2, CBORE_FOR_M2_5_SHCS1_CBORE_DEPTH)

    # CBORE for M2.5 SHCS2 (through all)
    with Locations(Plane.XY.offset(8)):
        with Locations((8.25, -4.99020314)):
            CounterBoreHole(CBORE_FOR_M2_5_SHCS2_D / 2, CBORE_FOR_M2_5_SHCS2_CBORE_D / 2, CBORE_FOR_M2_5_SHCS2_CBORE_DEPTH)


with BuildPart() as body_2:
    # Sketch16 → Boss-Extrude2 (new body)
    with BuildSketch(Plane.XY.offset(3)):
        with Locations((8.25, -4.99020314)):
            Circle(SKETCH16_R)
    extrude(amount=BOSS_EXTRUDE2_DEPTH)

    # Sketch17 → Boss-Extrude3 (add)
    with BuildSketch(Plane(origin=(0, 0, 3), x_dir=(-1, 0, 0), z_dir=(0, 0, -1))):
        with Locations(Location((-8.25, -4.99020314, 0), (0, 0, 180))):  # turned: the seam where the file's is
            Circle(SKETCH17_R)
    extrude(amount=BOSS_EXTRUDE3_DEPTH)

    # Chamfer2
    chamfer2_edges = [body_2.edges().sort_by_distance(p)[0] for p in [
        (6, -4.99020314, 3),
        (6, -4.99020314, 5.5),
        (7, -4.99020314, -5.5),
    ]]
    chamfer(chamfer2_edges, length=CHAMFER2_SIZE)

    # Sketch18 → Cut-Extrude7 (cut)
    with BuildSketch(Plane.XY.offset(5.5)):
        Polygon((8.25, -6.144903678), (9.25, -5.567553409), (9.25, -4.41285287), (8.25, -3.835502601), (7.25, -4.41285287), (7.25, -5.567553409), align=None)
    extrude(amount=-CUT_EXTRUDE7_DEPTH, mode=Mode.SUBTRACT)


with BuildPart() as body_3:
    # Mirror1: mirrored copy
    add(body_2.part.mirror(Plane(origin=(0, 0, 0), x_dir=(0, 0, 1), z_dir=(1, 0, 0))))


with BuildPart() as cirpattern1_1:
    # CirPattern1: pattern copy
    add(body_3.part.rotate(Axis((0, 0, 0), (1, 0, 0)), 1 * CIRPATTERN1_ANGLE / (CIRPATTERN1_COUNT - 1)))


solid = Compound([part.part, body_2.part, cirpattern1_1.part])
